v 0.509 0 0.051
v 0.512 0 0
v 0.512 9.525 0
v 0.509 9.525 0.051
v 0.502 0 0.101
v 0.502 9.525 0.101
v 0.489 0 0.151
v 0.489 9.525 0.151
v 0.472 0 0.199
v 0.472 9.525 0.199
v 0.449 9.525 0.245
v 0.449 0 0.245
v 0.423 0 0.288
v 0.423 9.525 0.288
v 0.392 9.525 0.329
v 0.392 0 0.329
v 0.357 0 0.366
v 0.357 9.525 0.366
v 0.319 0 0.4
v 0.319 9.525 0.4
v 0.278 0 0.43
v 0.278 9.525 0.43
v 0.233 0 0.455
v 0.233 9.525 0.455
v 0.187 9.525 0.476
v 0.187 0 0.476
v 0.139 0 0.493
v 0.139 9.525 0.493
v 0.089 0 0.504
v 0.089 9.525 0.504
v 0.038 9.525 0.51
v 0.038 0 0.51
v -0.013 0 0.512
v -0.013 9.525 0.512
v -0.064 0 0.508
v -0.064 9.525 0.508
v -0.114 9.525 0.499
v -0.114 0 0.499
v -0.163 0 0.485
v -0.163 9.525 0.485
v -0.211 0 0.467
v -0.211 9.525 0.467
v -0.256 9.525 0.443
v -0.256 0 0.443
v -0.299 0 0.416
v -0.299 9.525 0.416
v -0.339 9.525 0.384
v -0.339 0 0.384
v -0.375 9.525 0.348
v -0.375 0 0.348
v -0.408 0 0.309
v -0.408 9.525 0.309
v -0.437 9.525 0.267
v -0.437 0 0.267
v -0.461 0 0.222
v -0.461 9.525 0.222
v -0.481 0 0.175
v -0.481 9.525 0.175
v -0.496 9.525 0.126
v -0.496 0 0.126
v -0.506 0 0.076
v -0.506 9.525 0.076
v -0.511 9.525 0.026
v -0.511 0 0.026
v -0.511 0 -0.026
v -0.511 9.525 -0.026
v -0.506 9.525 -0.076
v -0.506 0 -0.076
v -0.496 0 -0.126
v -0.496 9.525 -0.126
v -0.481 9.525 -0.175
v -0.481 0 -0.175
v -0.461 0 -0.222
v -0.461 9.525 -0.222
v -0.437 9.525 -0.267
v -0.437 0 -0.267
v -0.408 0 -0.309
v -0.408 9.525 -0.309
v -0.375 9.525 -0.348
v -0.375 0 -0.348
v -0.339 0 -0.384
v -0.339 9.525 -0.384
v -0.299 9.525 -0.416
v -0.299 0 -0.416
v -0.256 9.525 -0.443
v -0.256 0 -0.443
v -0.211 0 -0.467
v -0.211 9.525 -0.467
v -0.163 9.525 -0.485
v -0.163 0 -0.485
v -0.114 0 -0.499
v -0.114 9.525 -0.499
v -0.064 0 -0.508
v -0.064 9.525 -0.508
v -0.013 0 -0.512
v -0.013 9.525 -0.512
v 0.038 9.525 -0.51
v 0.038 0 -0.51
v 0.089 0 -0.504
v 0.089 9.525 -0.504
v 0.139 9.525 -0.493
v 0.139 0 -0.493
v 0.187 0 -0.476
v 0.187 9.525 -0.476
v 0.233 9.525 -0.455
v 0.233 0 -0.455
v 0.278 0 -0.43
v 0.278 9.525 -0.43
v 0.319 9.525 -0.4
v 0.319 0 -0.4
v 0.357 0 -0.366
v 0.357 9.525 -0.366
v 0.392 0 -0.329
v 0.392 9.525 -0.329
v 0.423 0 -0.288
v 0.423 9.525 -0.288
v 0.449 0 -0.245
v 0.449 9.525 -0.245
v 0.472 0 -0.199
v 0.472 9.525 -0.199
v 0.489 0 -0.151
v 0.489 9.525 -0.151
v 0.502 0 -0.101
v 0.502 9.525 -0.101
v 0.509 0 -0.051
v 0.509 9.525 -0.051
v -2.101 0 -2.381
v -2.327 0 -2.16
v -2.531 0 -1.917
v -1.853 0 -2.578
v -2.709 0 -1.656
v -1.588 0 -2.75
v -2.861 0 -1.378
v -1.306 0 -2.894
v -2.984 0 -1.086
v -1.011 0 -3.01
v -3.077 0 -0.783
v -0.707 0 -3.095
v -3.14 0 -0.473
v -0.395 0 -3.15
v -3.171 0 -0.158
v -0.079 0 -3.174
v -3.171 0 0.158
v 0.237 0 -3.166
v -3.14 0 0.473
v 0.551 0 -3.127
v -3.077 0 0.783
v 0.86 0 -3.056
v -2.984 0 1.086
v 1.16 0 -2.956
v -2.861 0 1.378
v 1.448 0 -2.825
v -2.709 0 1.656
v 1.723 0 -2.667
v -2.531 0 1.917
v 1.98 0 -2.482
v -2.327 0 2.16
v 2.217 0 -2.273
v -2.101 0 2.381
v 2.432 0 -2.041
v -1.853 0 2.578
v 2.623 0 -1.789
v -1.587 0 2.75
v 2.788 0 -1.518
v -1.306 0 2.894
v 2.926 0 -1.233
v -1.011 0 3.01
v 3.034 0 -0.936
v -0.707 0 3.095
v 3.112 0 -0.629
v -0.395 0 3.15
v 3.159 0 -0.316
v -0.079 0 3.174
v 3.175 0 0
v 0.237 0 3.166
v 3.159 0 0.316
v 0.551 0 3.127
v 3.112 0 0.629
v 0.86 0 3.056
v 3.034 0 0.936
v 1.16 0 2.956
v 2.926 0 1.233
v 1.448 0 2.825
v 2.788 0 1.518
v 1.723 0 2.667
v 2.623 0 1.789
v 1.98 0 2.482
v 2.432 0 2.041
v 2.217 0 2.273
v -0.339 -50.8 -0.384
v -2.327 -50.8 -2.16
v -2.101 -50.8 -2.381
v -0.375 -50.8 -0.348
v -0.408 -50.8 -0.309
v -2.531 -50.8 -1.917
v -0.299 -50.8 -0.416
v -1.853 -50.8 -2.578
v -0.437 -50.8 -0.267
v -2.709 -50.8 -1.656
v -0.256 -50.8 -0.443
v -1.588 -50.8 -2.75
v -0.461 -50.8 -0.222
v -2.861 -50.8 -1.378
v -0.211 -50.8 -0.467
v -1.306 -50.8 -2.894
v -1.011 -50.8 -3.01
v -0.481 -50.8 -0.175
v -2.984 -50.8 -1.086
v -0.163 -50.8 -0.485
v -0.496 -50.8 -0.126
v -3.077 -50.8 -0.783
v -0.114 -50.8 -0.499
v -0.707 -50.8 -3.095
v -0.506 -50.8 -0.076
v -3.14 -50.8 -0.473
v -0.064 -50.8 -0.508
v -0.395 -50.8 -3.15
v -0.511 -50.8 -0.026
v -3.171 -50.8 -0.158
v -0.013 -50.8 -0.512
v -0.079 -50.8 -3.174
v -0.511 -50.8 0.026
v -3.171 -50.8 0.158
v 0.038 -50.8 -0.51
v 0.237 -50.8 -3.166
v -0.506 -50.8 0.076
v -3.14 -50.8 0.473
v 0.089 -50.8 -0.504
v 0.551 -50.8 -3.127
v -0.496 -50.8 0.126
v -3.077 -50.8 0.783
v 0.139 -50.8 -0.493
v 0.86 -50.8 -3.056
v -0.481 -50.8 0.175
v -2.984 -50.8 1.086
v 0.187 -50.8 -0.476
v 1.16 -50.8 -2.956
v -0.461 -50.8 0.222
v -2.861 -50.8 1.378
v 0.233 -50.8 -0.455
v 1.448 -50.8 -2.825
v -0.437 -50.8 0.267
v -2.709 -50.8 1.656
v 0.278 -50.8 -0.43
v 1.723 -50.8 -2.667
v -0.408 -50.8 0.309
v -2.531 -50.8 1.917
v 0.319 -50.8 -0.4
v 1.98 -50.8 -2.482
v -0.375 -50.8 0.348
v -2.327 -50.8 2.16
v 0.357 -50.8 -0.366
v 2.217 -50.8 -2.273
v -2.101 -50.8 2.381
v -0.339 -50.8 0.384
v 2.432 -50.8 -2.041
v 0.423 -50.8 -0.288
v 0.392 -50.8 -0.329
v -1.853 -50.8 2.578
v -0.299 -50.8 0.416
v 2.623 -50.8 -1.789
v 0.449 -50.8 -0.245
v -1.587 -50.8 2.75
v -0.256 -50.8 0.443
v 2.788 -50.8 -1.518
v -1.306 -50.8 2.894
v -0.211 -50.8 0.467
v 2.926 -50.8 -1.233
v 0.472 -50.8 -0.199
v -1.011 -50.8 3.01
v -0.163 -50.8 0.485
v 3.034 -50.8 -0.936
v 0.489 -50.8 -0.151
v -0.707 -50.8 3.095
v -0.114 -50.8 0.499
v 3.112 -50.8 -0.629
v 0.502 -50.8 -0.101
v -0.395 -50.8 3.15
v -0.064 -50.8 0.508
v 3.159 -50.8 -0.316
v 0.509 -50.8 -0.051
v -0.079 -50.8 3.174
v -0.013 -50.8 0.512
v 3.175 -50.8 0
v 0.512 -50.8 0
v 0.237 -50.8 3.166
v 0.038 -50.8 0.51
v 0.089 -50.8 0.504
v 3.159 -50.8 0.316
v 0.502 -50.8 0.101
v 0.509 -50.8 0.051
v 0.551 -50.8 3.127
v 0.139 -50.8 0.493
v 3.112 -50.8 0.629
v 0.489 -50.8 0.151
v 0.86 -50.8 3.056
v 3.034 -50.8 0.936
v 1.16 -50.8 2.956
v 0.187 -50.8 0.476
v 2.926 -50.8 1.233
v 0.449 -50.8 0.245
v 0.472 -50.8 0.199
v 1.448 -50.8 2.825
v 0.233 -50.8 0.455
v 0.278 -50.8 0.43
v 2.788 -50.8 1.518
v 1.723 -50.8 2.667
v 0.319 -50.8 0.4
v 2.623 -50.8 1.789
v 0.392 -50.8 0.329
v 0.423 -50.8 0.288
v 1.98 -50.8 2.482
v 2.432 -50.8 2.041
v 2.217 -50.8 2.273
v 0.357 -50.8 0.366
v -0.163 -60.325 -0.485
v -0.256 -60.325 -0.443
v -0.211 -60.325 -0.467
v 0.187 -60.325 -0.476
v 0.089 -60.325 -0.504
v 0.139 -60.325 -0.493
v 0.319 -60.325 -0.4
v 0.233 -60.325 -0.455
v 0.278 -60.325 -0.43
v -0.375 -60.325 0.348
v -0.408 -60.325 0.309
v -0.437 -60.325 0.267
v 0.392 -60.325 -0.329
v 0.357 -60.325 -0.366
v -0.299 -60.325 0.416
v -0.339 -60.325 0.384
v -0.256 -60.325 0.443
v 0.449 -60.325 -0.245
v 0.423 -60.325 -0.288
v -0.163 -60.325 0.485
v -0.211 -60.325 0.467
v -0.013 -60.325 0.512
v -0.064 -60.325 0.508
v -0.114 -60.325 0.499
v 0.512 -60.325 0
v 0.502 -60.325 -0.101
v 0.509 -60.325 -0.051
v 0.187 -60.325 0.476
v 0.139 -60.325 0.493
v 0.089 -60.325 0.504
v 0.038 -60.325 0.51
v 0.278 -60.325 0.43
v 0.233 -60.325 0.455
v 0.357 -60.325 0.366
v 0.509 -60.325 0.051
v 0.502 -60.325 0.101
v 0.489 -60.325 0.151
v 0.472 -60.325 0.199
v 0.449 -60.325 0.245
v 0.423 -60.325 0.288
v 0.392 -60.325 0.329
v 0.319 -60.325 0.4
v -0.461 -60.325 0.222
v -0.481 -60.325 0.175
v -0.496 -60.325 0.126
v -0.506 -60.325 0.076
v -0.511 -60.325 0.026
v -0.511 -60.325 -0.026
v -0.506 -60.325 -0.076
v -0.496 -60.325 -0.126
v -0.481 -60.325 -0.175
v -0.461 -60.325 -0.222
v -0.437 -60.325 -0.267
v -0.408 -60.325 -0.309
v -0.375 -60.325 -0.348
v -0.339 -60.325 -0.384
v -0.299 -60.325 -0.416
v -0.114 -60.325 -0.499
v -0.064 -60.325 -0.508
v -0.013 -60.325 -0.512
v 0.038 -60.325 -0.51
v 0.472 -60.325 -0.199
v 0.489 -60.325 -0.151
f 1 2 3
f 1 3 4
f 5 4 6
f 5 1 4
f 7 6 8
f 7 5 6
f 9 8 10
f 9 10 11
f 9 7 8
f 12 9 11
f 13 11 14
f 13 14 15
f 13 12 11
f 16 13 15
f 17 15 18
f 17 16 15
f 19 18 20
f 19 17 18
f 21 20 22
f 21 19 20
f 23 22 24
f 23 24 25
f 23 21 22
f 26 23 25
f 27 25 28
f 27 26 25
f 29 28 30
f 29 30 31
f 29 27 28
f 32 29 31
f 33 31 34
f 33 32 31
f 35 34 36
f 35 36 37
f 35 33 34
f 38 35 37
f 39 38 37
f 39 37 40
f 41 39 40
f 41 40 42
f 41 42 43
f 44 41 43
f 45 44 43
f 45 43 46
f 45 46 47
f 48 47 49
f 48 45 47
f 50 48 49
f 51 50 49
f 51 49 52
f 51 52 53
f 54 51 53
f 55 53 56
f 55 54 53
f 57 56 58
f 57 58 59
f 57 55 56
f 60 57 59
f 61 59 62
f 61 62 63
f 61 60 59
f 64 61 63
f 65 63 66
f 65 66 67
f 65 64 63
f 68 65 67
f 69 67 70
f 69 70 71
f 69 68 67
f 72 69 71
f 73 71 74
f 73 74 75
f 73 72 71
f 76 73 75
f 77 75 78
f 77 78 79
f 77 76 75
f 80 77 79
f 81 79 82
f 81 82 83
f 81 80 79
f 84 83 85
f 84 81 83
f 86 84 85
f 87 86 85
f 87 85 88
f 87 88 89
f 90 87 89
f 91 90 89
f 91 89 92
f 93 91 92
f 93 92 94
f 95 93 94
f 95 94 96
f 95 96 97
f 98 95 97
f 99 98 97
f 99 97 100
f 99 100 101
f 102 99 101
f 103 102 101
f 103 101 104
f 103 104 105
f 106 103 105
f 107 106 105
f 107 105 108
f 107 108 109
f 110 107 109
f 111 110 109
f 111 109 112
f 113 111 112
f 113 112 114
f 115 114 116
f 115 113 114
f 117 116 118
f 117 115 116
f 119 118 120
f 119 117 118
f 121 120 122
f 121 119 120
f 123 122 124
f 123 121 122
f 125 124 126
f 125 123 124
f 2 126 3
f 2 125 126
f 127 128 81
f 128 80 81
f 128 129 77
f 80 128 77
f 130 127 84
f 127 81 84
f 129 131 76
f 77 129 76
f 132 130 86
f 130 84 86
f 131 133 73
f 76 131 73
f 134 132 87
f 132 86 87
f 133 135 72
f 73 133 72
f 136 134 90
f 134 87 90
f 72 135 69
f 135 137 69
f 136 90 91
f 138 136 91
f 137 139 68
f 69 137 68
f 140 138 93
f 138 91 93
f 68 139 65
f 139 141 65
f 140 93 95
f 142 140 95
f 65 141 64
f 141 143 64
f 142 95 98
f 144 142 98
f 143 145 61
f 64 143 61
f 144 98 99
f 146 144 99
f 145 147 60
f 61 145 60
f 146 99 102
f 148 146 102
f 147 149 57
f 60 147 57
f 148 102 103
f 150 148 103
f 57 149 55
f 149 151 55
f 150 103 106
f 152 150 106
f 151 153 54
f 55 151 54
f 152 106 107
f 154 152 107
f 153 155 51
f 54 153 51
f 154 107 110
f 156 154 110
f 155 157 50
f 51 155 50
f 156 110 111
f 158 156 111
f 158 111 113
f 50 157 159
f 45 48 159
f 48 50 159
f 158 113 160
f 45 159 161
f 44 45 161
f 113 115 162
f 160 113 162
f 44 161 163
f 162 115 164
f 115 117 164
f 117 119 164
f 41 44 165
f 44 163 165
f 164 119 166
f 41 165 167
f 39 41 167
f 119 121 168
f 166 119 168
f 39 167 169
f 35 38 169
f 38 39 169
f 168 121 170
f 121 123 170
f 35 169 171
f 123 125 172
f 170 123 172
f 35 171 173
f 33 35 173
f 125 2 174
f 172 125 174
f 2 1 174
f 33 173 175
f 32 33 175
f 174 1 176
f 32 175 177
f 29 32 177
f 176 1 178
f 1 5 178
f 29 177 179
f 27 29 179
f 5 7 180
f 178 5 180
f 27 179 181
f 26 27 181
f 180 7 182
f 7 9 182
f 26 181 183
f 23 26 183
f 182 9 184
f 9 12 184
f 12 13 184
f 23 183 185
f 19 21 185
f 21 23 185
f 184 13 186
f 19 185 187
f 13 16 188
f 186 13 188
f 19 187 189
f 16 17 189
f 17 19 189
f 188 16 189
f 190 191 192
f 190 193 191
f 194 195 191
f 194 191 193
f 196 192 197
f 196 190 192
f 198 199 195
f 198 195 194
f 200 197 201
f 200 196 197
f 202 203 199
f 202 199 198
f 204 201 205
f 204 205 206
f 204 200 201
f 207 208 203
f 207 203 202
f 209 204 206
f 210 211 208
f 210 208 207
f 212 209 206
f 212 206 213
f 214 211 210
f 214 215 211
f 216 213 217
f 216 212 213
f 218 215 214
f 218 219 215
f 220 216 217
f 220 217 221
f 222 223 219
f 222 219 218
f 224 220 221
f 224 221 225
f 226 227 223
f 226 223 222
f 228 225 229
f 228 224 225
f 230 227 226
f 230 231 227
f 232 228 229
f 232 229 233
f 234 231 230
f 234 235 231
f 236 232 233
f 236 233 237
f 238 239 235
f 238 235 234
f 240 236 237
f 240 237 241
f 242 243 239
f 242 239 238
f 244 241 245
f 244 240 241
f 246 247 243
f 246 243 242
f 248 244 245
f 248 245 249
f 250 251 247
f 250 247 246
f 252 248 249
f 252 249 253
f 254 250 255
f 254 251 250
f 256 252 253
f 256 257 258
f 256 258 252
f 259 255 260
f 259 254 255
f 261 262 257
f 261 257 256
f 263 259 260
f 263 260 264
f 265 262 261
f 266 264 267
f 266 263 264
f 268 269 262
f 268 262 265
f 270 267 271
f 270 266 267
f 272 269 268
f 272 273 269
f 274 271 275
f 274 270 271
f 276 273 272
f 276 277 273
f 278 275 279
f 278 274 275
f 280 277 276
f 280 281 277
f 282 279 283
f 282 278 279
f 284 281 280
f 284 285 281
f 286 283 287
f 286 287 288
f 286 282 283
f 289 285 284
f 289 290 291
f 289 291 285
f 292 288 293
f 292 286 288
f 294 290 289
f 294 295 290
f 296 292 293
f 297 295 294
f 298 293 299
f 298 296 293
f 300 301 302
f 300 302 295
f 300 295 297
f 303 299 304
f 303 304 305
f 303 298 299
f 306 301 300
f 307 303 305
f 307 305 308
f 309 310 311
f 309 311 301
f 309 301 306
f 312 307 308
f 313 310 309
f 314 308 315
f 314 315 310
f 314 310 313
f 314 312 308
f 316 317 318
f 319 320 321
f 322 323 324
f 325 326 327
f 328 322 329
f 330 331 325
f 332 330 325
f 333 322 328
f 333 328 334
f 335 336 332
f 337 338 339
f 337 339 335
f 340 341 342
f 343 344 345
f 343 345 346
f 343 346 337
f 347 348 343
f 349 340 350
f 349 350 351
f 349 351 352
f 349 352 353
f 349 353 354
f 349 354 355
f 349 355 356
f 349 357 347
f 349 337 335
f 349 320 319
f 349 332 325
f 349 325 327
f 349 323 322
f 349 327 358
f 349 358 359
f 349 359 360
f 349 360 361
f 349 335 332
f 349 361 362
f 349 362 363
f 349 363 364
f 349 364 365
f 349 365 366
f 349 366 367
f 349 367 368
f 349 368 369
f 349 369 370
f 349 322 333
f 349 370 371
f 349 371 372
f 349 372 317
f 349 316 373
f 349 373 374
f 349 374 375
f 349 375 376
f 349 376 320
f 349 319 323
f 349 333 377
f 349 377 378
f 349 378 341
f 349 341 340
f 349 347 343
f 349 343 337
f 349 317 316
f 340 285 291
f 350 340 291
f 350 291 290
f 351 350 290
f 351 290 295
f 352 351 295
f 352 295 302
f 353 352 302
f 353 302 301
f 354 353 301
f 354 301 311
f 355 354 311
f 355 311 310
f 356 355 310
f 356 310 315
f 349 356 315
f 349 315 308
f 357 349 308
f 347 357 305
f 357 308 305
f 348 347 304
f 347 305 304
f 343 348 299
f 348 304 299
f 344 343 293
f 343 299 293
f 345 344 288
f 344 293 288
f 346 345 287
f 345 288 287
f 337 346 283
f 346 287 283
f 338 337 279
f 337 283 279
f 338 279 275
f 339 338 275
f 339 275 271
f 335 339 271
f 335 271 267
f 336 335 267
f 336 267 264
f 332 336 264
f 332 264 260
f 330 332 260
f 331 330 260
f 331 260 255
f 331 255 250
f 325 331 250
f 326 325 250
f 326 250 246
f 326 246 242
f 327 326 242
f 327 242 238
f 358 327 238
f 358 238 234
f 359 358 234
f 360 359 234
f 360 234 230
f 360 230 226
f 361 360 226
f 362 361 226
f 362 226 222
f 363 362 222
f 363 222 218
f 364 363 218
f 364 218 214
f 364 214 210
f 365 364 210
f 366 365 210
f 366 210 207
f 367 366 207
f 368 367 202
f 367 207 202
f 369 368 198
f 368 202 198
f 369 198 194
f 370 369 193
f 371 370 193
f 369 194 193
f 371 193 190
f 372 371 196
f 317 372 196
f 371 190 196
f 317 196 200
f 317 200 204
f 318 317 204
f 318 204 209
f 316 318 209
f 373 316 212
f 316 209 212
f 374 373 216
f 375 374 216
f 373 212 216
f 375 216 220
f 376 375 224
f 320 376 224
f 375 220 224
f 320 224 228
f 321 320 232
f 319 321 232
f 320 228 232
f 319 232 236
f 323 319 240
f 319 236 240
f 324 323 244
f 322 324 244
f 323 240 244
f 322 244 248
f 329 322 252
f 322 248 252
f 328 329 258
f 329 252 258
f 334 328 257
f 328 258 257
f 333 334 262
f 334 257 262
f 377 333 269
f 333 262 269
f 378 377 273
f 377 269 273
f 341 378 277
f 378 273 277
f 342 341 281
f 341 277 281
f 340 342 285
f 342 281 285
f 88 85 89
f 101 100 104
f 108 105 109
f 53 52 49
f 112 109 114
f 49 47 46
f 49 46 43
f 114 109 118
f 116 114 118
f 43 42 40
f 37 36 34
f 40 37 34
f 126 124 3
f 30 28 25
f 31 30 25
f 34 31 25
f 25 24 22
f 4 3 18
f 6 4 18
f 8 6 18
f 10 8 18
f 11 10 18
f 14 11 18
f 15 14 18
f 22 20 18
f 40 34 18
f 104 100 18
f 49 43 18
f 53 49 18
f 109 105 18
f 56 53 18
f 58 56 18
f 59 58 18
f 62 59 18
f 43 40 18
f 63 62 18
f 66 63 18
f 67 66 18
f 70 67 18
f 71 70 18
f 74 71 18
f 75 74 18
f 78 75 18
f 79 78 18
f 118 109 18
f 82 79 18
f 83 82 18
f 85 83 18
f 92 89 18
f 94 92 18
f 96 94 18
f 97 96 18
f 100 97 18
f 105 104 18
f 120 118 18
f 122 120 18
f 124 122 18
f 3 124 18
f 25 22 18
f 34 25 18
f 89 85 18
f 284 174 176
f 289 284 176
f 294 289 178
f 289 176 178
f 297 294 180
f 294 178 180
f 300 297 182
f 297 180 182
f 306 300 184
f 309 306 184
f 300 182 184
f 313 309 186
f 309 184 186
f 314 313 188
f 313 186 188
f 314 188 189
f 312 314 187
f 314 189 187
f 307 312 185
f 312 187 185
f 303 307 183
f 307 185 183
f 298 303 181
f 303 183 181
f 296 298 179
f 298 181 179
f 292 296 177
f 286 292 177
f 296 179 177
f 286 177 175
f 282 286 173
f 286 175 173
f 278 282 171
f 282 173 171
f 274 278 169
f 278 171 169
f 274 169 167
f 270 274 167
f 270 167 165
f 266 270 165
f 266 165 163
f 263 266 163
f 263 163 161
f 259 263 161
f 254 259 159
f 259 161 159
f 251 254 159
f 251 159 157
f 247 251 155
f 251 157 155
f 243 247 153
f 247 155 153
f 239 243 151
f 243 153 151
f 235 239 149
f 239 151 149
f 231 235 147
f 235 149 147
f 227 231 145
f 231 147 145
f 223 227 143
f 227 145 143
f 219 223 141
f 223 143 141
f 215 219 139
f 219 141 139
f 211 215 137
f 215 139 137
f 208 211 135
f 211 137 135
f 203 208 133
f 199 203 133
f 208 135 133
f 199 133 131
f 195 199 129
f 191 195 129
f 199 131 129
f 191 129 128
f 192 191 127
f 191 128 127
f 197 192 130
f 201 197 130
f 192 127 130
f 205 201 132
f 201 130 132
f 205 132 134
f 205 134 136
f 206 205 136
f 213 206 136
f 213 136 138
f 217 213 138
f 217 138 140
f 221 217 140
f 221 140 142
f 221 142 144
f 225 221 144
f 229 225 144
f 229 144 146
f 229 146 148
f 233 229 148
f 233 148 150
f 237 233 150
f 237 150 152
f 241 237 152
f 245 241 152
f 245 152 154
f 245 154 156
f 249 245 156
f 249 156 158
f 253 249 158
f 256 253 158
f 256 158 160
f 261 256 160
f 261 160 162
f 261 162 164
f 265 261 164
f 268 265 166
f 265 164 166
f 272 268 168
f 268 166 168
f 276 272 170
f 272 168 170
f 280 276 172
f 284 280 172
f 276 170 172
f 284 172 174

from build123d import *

# Parameters (mm, degrees)
F2_R     = 3.175
F5_DEPTH = 50.8
F3_R     = 0.51181
F6_DEPTH = 9.525
F4_R     = 0.51181
F7_DEPTH = 60.325


with BuildPart() as f5:
    # F2 (on Front) → F5 (new body)
    with BuildSketch(Plane.XZ):
        Circle(F2_R)
    extrude(amount=F5_DEPTH)

    # F3 (on Front) → F6 (join)
    with BuildSketch(Plane.XZ):
        Circle(F3_R)
    extrude(amount=-F6_DEPTH)

    # F4 (on Front) → F7 (join)
    with BuildSketch(Plane.XZ):
        Circle(F4_R)
    extrude(amount=F7_DEPTH)


solid = f5.part
